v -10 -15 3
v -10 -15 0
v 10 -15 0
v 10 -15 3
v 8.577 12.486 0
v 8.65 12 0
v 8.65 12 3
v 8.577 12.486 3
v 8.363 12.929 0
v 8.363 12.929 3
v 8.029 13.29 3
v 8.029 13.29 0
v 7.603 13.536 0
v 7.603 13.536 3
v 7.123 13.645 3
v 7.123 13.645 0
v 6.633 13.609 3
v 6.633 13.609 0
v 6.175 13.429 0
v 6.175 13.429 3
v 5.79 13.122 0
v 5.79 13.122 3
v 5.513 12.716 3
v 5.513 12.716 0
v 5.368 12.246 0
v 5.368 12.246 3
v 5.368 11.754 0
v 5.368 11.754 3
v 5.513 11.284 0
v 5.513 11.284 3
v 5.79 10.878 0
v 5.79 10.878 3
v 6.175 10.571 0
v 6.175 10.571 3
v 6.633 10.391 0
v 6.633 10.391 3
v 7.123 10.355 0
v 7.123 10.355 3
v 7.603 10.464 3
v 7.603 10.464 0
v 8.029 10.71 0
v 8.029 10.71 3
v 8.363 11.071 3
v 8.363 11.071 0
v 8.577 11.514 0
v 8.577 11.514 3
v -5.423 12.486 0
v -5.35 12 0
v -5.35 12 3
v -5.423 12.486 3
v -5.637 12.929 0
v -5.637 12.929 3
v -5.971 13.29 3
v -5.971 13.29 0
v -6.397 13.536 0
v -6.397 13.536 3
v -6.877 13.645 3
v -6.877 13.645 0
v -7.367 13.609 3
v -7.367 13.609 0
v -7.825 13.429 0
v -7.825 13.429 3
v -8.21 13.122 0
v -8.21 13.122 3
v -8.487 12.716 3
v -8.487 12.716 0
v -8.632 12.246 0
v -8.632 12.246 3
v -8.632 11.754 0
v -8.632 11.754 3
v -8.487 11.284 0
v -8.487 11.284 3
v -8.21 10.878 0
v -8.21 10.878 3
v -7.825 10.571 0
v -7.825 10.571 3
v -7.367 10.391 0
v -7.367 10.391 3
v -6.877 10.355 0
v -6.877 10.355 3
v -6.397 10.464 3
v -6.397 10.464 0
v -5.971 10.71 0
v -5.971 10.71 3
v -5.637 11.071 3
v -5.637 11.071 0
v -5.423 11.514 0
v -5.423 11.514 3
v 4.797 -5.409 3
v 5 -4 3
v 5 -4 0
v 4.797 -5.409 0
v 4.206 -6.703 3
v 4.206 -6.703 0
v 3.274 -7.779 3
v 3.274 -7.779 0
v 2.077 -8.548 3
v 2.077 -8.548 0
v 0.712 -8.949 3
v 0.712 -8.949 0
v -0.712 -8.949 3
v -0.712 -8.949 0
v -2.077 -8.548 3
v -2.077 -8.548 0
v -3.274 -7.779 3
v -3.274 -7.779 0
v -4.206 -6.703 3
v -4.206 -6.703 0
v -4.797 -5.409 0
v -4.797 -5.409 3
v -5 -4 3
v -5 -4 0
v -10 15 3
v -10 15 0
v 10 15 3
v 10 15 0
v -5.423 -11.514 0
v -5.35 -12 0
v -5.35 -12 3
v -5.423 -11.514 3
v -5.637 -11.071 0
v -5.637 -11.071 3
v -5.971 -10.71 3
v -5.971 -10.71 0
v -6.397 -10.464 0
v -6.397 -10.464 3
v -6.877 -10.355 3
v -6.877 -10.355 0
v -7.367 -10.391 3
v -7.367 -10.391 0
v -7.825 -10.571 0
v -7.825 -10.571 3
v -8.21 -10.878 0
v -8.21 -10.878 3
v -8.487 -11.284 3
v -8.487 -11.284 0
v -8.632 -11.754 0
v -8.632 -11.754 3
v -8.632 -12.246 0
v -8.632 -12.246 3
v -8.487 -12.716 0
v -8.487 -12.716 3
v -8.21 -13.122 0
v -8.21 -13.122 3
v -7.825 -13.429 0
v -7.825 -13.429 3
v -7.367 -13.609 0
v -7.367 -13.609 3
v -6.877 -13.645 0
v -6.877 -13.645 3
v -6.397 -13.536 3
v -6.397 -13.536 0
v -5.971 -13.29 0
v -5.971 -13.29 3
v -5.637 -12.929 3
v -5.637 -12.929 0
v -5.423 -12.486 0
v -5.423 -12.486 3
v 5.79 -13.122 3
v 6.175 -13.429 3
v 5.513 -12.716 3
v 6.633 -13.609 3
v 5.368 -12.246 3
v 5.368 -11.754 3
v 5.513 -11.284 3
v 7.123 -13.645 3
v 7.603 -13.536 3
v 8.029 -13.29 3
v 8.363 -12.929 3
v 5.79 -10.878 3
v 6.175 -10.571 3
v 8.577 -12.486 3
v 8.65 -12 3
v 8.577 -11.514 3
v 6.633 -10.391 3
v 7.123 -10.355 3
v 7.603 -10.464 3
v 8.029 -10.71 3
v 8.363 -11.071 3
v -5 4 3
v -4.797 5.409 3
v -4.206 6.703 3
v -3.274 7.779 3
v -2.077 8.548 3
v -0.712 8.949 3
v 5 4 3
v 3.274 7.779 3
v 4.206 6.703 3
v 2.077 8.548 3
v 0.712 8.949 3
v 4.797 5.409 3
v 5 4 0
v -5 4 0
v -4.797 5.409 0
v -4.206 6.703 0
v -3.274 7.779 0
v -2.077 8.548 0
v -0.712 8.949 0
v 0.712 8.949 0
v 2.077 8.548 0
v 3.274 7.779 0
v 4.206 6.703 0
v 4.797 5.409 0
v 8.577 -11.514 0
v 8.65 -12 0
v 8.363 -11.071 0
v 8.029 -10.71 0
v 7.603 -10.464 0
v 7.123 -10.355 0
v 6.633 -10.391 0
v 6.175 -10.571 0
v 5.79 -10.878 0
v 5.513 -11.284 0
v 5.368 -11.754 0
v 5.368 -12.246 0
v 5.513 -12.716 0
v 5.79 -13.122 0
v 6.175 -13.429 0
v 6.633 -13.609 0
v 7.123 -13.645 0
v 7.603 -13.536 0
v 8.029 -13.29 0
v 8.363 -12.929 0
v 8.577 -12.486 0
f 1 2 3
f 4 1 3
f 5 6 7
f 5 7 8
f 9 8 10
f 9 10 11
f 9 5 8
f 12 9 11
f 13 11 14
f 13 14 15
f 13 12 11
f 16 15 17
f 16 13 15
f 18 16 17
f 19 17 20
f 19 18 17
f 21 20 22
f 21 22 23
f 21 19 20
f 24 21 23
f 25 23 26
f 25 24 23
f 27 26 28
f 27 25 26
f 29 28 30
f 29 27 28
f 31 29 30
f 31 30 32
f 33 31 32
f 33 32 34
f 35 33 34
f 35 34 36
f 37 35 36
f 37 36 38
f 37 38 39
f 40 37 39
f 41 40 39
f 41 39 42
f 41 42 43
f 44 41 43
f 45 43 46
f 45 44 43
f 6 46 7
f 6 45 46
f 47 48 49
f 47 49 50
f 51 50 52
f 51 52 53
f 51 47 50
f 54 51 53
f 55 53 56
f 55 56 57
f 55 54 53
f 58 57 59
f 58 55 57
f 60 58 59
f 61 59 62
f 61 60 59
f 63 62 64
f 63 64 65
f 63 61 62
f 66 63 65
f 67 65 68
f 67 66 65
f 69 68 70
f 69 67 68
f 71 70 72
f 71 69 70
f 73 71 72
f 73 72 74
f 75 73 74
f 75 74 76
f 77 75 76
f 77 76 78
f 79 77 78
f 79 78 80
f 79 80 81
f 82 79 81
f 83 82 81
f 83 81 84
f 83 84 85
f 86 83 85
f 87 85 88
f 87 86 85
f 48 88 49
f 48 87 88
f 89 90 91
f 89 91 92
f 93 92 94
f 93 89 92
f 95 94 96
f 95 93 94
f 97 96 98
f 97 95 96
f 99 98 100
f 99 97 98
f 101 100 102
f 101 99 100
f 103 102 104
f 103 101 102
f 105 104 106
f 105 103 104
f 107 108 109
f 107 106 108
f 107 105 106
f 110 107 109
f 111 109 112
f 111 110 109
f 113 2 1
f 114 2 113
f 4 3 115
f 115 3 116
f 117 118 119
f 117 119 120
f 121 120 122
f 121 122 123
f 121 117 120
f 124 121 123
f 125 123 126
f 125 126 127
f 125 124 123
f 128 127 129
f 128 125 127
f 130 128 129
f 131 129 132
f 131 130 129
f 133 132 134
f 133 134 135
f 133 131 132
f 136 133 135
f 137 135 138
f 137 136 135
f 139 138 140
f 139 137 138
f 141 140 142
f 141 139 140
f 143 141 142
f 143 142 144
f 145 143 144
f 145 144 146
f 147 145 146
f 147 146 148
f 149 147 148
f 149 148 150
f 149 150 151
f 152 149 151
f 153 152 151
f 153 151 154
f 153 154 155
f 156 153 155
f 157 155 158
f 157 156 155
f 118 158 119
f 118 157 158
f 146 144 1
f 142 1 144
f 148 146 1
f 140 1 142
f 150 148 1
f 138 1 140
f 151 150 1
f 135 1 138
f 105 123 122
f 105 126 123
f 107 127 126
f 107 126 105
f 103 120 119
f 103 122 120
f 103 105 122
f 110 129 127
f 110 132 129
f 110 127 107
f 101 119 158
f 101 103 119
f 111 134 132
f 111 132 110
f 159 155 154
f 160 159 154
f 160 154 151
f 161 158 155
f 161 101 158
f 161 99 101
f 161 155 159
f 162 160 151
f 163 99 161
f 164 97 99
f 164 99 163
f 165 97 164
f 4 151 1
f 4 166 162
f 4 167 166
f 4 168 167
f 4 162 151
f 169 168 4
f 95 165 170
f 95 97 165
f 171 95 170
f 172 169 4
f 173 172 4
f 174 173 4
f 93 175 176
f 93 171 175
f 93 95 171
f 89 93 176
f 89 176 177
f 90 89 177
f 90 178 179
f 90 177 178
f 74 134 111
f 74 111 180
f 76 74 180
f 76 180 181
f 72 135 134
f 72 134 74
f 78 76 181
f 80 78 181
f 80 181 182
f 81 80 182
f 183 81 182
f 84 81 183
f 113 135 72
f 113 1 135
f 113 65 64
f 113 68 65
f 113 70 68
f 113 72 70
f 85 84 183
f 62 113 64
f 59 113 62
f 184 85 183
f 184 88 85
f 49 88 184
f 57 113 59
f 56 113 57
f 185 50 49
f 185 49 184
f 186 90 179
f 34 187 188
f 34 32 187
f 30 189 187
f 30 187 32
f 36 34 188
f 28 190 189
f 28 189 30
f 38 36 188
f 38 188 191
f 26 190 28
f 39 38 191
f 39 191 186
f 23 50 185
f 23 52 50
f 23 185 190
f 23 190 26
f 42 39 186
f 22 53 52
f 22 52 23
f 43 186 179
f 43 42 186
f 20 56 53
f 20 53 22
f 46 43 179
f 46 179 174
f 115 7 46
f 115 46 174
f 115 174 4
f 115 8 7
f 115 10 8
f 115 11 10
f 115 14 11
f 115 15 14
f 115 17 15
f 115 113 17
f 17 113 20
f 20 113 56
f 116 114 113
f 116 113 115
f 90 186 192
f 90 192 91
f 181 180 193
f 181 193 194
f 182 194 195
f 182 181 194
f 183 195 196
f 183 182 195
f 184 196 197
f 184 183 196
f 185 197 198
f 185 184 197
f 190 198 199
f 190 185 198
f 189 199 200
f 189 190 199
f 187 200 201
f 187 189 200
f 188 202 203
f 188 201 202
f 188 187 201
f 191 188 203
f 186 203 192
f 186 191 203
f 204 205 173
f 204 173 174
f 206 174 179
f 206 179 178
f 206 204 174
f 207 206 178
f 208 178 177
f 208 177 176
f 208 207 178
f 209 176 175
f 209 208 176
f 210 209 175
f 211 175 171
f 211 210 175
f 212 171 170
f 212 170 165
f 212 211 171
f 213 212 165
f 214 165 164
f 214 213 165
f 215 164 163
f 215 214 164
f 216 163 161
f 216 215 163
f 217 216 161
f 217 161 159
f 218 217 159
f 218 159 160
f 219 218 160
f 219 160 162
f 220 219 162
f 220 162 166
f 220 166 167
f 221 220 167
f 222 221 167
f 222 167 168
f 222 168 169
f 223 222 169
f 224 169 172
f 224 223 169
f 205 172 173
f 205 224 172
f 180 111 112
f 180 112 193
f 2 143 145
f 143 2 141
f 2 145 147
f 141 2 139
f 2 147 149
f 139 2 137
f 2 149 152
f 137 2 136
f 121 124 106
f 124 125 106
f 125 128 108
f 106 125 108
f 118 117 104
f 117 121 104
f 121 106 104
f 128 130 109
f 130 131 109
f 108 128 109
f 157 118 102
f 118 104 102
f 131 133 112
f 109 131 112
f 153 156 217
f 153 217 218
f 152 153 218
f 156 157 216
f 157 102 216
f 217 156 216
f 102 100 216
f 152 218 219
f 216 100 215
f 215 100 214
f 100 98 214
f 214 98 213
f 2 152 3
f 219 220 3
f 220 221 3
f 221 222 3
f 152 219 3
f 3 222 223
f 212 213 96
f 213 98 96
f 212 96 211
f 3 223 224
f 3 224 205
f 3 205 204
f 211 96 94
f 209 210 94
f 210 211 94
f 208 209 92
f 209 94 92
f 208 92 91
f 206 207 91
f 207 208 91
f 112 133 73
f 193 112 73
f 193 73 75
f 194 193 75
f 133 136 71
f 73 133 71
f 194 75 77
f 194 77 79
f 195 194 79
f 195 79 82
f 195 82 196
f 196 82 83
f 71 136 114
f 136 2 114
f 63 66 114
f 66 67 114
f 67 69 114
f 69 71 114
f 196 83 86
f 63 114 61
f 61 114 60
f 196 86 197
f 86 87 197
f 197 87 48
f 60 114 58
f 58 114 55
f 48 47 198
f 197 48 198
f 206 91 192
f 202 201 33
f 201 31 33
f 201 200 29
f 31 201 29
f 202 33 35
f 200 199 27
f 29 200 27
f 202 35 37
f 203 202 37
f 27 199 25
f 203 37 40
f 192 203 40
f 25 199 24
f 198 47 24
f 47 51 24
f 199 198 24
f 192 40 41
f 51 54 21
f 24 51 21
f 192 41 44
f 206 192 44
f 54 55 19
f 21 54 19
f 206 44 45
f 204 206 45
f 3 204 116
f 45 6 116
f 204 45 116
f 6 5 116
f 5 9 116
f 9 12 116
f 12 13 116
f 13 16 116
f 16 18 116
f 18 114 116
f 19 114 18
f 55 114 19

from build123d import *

# Parameters (mm, degrees)
CROQUIS1_W              = 20
CROQUIS1_H              = 30
CROQUIS1_R              = 1.65
SALIENTE_EXTRUIR1_DEPTH = 3
CORTAR_EXTRUIR1_REACH   = 5


with BuildPart() as part:
    # Croquis1 → Saliente-Extruir1 (new body)
    with BuildSketch(Plane.XY):
        Rectangle(CROQUIS1_W, CROQUIS1_H)
        with Locations((-7, 12)):
            Circle(CROQUIS1_R, mode=Mode.SUBTRACT)
        with Locations((7, 12)):
            Circle(CROQUIS1_R, mode=Mode.SUBTRACT)
        with Locations((7, -12)):
            Circle(CROQUIS1_R, mode=Mode.SUBTRACT)
        with Locations((-7, -12)):
            Circle(CROQUIS1_R, mode=Mode.SUBTRACT)
    extrude(amount=SALIENTE_EXTRUIR1_DEPTH)

    # Croquis2 → Cortar-Extruir1 (cut, up to next)
    with BuildSketch(Plane.XY.offset(3), mode=Mode.PRIVATE) as cortar_extruir1_sk1:
        with BuildLine():
            Line((-5, -4), (-5, 4))
            ThreePointArc((-5, 4), (0, 9), (5, 4))
            Line((5, 4), (5, -4))
            ThreePointArc((5, -4), (0, -9), (-5, -4))
        make_face()
    cortar_extruir1_tool1 = extrude(cortar_extruir1_sk1.sketch, amount=-CORTAR_EXTRUIR1_REACH, mode=Mode.PRIVATE) & part.part
    add(cortar_extruir1_tool1.solids().sort_by_distance((0, 0, 3))[0], mode=Mode.SUBTRACT)


solid = part.part
